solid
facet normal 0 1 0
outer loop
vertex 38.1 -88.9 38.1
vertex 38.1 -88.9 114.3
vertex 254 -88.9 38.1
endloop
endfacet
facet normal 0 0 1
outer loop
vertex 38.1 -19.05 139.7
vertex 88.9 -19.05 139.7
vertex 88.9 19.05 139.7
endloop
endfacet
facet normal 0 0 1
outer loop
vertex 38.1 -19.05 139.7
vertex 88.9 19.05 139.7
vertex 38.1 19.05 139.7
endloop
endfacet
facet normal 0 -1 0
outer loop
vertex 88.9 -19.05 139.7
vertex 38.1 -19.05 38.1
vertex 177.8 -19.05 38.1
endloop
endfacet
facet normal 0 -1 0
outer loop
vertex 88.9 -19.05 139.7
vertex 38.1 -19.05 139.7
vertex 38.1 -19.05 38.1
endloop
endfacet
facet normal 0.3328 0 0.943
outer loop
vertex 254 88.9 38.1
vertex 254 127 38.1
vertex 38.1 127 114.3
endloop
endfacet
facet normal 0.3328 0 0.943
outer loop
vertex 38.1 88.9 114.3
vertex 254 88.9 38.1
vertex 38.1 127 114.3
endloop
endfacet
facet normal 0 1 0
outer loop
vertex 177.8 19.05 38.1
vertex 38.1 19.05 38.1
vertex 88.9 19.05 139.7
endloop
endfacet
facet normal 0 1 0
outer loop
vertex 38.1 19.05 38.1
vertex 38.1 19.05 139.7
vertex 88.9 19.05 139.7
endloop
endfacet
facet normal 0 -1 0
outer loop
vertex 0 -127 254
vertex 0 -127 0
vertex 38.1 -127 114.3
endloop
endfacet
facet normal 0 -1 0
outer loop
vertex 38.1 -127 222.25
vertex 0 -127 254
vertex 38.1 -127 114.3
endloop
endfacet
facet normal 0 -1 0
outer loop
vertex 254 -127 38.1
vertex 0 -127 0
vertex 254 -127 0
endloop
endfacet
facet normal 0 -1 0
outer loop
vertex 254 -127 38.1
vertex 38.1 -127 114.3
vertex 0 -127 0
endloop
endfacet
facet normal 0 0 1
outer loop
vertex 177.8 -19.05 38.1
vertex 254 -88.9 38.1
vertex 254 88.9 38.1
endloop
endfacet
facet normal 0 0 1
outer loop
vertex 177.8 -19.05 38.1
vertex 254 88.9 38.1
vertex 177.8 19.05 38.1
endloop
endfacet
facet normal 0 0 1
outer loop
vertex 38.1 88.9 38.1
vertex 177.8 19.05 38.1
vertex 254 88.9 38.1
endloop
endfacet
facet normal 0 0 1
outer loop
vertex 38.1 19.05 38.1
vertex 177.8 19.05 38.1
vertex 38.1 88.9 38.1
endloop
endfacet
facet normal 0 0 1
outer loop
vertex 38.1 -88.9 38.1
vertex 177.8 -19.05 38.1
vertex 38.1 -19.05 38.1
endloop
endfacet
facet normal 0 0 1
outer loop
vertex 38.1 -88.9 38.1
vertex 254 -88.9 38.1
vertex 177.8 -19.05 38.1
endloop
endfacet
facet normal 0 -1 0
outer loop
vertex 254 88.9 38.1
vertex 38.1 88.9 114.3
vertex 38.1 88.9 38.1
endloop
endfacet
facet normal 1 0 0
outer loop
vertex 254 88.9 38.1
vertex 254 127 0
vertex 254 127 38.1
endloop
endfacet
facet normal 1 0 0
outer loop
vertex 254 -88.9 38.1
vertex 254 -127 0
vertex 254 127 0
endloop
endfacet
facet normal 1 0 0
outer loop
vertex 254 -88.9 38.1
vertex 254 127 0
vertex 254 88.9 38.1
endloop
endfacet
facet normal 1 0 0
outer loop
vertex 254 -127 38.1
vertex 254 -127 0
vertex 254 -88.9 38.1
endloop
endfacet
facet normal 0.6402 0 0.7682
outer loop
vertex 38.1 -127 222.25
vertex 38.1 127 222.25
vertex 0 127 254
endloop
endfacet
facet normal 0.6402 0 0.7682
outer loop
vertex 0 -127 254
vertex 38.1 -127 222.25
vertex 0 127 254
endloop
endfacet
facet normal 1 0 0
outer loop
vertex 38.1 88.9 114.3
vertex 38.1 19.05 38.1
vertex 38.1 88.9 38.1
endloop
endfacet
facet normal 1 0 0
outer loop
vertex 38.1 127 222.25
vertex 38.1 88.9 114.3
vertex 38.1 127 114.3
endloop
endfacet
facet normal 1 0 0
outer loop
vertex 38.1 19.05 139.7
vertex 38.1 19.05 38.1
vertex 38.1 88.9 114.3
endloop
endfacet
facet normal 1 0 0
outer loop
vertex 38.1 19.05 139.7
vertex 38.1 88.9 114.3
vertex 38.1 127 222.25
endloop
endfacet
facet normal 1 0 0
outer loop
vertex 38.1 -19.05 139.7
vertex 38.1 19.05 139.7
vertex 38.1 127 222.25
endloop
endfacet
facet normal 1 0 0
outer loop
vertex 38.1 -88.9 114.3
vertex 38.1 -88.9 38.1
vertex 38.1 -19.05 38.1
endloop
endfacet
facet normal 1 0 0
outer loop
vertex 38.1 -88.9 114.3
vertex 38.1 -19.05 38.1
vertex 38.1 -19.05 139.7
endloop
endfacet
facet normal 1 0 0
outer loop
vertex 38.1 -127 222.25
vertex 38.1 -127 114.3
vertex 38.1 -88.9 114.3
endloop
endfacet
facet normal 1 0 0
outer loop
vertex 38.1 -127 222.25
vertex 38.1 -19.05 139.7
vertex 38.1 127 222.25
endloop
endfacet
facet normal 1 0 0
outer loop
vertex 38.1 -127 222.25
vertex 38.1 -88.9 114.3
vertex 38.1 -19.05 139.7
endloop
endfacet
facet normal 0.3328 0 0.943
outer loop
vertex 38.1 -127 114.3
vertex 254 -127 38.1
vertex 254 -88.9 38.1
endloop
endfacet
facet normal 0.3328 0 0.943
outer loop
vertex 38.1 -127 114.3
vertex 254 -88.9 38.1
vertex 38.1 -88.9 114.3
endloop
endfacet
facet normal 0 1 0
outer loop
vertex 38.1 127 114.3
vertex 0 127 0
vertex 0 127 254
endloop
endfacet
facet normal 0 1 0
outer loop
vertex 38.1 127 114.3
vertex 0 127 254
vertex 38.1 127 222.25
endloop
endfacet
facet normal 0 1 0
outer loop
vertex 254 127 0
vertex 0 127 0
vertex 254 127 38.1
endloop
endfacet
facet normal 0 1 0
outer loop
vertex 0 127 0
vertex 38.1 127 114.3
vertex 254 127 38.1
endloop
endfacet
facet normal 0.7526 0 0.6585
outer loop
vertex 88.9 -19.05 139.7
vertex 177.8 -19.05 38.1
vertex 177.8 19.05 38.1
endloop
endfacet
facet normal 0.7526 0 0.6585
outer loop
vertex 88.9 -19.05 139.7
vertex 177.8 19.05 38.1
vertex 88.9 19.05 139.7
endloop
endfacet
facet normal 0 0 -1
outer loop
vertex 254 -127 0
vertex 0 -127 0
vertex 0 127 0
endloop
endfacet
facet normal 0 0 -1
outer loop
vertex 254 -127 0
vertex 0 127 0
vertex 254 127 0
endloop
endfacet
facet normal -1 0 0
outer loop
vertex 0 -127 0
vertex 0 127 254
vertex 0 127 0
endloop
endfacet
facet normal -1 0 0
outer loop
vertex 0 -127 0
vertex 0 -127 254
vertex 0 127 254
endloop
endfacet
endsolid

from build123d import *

# Parameters (mm, degrees)
F1_DEPTH = 127
F2_DEPTH = 19.05
F4_DEPTH = 38.1


# Not quite as in the source:
# - a pattern or mirror of a feature is missing from the dataset's text; its kind, count and spacing are read off the source's solid


with BuildPart() as f1:
    # F0 (on Front) → F1 (new body, symmetric)
    with BuildSketch(Plane.XZ):
        Polygon((0, 254), (0, 0), (254, 0), (254, 38.1), (177.8, 38.1), (38.1, 38.1), (38.1, 139.7), (38.1, 222.25), align=None)
    extrude(amount=F1_DEPTH, both=True)

    # F0 (on Front) → F2 (join, symmetric)
    with BuildSketch(Plane.XZ):
        Polygon((38.1, 38.1), (177.8, 38.1), (88.9, 139.7), (38.1, 139.7), align=None)
    extrude(amount=F2_DEPTH, both=True)

    # F3 (on face) → F4 (join)
    with BuildSketch(Plane.XZ.offset(127)):
        Polygon((254, 38.1), (38.1, 114.3), (38.1, 38.1), align=None)
    f4 = extrude(amount=-F4_DEPTH)

    # F4_copies: F4 across plane
    add(f4.mirror(Plane.ZX))


solid = f1.part
